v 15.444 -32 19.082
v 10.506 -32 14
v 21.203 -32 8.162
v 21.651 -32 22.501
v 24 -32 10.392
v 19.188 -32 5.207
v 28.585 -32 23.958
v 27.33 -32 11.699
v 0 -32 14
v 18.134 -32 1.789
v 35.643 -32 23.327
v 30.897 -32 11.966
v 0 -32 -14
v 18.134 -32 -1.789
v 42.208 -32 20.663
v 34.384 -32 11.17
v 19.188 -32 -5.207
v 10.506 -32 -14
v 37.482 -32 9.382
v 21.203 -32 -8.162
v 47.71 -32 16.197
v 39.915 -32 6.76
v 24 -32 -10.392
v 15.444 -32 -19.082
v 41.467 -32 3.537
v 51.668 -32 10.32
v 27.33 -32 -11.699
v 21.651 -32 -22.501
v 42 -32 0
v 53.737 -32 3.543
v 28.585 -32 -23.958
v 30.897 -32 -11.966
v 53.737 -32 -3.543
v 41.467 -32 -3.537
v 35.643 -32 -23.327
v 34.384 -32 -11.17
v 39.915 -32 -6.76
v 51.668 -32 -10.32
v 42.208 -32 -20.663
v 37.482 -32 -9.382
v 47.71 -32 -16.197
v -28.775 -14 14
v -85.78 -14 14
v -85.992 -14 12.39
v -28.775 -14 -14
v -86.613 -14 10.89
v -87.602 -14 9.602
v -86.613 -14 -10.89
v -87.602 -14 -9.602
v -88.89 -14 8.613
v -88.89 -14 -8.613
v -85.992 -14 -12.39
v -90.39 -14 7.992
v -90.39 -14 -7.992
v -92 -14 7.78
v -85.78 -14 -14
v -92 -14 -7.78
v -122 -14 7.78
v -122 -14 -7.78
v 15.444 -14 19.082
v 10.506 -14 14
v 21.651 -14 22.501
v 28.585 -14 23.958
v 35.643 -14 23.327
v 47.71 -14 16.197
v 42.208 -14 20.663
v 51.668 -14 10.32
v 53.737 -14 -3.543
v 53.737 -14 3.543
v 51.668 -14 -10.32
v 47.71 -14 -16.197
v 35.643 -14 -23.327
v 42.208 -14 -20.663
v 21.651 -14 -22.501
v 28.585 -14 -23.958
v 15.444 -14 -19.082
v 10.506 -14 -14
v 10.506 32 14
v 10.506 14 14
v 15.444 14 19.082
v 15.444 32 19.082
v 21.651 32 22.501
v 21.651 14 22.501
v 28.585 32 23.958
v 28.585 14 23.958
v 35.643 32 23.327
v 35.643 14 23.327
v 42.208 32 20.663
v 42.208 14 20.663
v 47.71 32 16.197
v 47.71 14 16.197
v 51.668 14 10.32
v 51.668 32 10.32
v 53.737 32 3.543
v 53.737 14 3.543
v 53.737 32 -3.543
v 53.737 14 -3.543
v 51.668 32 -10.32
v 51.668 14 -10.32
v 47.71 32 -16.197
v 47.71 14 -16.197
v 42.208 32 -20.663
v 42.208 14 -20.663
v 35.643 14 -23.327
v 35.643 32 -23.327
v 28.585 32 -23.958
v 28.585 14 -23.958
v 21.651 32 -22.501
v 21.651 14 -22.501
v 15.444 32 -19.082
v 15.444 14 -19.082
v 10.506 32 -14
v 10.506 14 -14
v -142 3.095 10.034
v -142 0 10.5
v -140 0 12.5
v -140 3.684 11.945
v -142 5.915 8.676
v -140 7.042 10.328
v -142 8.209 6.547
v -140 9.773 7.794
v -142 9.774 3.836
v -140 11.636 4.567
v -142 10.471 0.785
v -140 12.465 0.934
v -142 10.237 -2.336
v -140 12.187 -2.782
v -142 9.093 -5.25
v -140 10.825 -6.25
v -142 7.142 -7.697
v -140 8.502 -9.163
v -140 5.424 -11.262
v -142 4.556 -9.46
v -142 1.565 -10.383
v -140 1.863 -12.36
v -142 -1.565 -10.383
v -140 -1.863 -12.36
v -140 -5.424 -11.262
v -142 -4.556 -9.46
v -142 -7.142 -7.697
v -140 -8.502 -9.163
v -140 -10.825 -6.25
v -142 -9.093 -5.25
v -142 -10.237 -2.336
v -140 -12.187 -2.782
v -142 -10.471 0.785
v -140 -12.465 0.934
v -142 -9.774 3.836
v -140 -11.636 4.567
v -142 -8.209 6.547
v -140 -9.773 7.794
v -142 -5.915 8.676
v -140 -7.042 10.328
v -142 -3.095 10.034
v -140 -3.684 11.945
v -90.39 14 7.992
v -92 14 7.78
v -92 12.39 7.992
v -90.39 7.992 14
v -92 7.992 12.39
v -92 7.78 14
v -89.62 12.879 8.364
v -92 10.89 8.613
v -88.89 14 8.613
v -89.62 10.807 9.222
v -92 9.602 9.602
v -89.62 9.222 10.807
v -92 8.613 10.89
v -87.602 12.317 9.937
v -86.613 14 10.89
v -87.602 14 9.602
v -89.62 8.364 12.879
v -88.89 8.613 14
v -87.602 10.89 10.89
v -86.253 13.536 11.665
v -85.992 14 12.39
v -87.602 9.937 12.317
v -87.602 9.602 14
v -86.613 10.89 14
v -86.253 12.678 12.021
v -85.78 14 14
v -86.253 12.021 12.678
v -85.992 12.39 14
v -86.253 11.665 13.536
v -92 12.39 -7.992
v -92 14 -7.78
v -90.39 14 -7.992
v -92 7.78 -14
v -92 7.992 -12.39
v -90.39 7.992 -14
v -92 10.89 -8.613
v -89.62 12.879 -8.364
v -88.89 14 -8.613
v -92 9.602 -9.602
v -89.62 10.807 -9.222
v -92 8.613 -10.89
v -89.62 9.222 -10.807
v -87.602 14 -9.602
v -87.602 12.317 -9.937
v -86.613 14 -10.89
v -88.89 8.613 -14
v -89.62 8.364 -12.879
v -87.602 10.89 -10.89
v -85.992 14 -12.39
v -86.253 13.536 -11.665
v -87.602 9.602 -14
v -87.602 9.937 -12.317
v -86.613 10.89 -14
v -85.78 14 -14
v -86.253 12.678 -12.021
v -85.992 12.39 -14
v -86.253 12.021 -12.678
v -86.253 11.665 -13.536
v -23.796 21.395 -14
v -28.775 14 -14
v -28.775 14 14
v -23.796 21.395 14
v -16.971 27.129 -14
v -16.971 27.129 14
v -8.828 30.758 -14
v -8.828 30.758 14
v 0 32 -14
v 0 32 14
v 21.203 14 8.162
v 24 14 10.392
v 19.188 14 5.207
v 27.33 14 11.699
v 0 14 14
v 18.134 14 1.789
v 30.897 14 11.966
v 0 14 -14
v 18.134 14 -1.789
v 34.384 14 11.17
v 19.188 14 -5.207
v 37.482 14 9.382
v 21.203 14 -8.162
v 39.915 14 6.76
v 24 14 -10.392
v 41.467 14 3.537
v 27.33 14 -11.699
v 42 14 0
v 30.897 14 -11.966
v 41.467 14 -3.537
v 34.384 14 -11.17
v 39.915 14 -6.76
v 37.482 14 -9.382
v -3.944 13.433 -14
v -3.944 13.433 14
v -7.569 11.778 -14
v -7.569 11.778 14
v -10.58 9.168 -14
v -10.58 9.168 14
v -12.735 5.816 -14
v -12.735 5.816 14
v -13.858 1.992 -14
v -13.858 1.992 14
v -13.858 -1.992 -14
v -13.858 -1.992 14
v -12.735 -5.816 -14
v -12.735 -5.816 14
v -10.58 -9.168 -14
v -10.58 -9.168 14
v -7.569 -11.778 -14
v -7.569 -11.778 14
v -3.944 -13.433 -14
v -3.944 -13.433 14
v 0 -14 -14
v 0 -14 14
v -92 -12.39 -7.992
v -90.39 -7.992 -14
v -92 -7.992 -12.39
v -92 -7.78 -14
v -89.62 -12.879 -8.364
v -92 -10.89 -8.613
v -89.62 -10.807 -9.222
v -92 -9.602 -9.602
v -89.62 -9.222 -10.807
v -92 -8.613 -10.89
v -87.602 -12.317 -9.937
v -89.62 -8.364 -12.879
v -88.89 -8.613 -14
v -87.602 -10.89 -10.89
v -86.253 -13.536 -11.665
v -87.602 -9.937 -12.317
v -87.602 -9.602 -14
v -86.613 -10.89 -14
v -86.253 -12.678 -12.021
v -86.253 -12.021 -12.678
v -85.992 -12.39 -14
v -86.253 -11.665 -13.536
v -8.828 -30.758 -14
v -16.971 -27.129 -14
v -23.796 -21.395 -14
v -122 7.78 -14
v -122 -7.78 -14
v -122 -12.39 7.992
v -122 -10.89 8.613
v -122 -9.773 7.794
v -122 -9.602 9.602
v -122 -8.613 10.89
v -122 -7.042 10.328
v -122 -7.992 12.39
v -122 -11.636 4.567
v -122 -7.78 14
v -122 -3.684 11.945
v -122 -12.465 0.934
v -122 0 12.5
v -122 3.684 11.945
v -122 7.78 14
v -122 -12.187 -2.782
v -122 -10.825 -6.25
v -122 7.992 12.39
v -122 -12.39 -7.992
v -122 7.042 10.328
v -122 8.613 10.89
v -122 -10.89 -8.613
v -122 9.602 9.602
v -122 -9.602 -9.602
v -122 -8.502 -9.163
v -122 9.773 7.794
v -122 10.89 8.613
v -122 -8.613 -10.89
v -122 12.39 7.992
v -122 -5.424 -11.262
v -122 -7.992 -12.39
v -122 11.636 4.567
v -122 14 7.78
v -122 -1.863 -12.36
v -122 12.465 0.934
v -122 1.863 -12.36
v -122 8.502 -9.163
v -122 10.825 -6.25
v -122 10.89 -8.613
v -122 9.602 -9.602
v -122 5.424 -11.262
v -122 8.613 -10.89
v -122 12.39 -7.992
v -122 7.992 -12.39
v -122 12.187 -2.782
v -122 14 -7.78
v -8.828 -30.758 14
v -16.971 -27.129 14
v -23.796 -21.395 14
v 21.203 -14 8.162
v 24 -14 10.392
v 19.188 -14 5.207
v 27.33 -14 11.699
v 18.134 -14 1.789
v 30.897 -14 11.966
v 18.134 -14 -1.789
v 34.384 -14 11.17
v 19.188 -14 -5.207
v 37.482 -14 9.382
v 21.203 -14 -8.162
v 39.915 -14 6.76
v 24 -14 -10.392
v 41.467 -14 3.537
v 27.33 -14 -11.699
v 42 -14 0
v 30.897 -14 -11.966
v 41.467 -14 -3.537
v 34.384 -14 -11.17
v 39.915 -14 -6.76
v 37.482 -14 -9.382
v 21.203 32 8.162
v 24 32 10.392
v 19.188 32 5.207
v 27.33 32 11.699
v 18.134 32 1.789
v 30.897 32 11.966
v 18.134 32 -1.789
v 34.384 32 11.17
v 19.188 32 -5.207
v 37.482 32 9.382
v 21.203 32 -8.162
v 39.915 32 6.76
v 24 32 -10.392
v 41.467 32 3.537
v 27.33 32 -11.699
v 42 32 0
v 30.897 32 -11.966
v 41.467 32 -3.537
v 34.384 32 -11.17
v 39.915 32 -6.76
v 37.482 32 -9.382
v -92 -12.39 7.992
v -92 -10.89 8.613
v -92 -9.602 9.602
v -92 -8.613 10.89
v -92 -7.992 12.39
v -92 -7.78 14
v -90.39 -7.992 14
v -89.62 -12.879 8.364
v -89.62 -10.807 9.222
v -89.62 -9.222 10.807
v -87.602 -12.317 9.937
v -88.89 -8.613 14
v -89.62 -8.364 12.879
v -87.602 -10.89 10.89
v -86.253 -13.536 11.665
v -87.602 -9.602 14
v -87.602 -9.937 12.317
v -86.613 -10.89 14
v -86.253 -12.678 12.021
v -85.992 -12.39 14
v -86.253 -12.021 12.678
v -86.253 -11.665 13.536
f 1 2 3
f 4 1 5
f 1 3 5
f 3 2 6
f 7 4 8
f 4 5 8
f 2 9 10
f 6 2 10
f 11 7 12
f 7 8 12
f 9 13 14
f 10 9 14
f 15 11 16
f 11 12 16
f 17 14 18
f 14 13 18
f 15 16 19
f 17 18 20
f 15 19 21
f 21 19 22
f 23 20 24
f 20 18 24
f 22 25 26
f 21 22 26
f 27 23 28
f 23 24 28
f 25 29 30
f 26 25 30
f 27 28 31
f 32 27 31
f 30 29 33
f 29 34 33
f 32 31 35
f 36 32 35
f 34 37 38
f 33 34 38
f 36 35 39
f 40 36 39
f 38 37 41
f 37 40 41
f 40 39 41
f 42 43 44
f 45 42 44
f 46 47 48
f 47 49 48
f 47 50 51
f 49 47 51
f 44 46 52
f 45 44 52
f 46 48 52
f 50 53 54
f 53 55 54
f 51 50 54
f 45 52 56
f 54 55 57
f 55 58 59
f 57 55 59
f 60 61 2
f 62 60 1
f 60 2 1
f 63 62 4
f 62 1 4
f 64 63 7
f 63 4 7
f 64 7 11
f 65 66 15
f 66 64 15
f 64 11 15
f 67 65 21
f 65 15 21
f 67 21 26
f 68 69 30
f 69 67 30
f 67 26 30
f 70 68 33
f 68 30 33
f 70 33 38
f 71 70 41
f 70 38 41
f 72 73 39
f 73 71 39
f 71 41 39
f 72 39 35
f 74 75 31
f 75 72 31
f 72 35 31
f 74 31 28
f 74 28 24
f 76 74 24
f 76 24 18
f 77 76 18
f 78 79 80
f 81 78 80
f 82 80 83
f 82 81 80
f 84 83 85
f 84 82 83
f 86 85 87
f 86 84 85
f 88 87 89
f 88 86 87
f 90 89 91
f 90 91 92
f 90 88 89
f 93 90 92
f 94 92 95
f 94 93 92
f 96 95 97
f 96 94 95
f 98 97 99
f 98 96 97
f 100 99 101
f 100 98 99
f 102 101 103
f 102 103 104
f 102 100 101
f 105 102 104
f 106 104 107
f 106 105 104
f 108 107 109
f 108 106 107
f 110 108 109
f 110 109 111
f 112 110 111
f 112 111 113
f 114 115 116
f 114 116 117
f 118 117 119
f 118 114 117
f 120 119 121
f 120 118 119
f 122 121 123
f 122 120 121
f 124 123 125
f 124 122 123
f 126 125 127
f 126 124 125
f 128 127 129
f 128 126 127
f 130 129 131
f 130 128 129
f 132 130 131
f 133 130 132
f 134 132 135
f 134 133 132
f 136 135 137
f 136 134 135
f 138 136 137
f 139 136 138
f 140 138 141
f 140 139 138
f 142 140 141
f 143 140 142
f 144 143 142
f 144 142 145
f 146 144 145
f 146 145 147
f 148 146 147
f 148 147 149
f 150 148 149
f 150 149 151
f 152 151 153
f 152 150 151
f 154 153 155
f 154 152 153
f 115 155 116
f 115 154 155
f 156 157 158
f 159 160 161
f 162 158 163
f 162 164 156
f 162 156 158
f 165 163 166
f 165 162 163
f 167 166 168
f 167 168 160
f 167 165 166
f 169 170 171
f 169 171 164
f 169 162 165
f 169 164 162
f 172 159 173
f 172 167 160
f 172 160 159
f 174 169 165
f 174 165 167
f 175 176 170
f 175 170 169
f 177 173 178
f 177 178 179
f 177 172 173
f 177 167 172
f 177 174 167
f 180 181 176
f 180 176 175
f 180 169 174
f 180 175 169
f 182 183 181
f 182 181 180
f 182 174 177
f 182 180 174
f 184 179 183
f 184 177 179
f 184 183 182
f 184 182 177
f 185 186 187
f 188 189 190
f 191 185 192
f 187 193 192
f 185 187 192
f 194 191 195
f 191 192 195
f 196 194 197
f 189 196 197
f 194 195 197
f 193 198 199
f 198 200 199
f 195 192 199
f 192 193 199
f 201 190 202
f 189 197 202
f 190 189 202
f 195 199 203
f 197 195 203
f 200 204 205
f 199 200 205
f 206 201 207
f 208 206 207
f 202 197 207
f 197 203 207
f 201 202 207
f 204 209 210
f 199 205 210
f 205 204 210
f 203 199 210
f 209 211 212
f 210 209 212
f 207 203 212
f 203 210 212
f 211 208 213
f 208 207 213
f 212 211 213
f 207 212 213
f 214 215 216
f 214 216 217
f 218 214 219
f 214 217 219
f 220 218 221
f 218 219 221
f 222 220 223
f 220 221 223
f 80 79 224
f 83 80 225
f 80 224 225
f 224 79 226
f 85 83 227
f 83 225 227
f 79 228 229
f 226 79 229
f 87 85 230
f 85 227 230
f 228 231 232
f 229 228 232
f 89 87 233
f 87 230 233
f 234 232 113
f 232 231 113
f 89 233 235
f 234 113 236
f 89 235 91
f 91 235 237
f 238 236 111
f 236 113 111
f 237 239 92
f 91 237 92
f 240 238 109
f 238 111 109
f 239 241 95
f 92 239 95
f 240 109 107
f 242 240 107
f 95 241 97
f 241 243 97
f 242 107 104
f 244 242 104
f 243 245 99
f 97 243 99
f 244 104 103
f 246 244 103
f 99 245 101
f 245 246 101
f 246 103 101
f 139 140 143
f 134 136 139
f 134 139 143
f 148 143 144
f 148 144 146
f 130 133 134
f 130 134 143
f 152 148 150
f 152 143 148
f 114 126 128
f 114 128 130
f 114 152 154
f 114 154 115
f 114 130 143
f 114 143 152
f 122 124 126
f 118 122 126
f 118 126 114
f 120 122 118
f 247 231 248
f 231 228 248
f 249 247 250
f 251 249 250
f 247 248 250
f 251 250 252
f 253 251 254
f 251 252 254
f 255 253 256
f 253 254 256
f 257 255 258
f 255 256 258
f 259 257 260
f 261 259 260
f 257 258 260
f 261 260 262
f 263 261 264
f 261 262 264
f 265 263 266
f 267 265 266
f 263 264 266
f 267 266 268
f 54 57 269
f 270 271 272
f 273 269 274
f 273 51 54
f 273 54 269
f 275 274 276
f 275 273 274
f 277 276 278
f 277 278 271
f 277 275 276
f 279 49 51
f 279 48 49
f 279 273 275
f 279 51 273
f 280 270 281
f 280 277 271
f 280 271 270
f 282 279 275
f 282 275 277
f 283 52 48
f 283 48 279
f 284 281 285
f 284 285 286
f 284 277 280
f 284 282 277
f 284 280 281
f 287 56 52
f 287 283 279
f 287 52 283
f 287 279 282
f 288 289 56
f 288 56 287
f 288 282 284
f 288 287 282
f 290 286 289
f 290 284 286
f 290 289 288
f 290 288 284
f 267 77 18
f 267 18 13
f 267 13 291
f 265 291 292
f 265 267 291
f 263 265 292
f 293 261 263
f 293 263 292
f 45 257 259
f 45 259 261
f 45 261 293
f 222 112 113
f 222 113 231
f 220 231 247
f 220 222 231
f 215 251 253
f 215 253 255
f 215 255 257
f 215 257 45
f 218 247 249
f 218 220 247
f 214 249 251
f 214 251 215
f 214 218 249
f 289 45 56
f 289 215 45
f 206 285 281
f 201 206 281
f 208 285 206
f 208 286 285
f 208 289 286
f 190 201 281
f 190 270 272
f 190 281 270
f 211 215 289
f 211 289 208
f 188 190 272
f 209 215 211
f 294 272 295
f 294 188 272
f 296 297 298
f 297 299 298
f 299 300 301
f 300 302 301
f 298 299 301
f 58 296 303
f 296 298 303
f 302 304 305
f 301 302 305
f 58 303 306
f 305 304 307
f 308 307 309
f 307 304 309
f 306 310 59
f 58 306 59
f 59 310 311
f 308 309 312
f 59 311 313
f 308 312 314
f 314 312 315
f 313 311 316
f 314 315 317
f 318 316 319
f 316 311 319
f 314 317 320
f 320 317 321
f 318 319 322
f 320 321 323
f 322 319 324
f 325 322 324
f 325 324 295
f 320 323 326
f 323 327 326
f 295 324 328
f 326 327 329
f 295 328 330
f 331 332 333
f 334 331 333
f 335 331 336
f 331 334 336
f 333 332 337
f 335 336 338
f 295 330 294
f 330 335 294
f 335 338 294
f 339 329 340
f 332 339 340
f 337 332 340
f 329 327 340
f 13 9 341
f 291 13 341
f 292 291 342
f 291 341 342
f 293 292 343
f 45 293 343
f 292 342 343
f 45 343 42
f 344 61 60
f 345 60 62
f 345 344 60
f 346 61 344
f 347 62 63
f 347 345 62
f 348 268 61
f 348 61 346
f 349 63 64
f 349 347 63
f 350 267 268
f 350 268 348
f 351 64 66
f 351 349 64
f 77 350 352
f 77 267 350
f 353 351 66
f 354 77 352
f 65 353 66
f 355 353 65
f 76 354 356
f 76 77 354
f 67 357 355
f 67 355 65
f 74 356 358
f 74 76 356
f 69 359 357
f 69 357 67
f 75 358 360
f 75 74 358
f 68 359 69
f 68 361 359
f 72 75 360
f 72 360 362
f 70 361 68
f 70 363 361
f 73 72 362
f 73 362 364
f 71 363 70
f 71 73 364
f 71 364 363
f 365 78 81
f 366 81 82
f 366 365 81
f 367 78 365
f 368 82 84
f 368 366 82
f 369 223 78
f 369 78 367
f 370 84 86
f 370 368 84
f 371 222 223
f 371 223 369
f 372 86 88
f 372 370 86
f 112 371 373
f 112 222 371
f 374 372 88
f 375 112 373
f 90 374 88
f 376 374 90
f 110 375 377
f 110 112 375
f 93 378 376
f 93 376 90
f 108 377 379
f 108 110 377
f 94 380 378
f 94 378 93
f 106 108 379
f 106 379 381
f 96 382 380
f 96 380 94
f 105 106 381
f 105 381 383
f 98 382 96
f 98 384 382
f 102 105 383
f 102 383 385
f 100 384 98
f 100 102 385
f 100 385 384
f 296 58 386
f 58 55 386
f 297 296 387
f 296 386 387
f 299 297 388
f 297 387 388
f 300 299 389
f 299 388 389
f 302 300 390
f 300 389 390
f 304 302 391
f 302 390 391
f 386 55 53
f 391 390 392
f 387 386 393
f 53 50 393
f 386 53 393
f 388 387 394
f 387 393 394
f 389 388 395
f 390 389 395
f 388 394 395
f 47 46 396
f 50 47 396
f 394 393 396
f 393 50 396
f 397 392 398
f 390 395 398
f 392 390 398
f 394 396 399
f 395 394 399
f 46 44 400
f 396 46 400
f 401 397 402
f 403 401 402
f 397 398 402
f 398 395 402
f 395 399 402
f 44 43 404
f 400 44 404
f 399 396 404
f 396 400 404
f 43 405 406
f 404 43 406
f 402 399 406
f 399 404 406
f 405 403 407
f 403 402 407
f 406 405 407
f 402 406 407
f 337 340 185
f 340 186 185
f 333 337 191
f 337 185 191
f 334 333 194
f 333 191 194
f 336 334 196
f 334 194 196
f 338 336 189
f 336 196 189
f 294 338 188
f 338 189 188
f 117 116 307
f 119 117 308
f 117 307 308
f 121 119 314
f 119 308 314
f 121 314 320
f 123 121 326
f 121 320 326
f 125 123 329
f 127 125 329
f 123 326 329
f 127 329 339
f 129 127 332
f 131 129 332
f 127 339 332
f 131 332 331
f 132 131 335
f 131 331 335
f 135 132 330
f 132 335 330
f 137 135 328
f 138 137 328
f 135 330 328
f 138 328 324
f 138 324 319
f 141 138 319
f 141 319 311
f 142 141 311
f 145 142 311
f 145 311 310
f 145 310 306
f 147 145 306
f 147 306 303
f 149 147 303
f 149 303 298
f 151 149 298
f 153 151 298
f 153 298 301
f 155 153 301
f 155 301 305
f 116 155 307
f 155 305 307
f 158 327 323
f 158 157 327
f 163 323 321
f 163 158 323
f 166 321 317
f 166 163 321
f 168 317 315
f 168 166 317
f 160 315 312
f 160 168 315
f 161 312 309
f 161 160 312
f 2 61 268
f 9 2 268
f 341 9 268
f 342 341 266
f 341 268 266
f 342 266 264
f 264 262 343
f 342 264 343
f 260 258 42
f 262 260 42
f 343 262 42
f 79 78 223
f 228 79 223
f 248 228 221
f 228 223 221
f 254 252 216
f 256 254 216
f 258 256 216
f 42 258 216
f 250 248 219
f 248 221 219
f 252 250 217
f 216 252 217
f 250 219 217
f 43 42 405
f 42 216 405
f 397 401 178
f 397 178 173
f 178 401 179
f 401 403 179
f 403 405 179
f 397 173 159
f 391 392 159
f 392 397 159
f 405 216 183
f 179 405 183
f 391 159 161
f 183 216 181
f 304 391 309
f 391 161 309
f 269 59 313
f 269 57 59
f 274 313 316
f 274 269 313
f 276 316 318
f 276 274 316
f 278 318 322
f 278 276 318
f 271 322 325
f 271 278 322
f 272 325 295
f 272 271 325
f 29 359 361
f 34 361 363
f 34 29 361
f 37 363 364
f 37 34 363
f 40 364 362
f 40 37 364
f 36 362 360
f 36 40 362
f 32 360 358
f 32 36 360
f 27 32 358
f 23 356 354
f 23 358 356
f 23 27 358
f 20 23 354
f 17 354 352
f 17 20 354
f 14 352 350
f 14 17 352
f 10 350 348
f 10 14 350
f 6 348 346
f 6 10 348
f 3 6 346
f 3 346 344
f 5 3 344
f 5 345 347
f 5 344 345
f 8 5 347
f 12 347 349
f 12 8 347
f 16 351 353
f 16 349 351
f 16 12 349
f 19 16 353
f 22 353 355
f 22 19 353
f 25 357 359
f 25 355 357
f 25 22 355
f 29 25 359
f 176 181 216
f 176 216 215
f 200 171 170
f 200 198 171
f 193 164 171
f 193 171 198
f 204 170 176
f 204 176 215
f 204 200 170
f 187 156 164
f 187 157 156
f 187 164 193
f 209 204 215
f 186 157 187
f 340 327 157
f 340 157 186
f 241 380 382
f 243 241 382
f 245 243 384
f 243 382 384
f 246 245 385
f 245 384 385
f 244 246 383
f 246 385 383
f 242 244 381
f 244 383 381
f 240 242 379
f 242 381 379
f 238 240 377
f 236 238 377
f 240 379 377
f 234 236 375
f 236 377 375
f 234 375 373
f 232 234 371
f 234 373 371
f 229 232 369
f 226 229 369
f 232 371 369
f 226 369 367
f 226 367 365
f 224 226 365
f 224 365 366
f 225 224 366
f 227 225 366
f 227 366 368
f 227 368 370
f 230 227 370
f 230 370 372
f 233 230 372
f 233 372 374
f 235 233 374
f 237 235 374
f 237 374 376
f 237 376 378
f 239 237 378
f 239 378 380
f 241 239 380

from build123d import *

# Parameters (mm, degrees)
BOSS_EXTRUDE1_DEPTH = 14
SKETCH2_R           = 24
SKETCH2_R_2         = 12
BOSS_EXTRUDE2_DEPTH = 18
BOSS_EXTRUDE3_REACH = 178
SKETCH3_W           = 28
SKETCH3_H           = 28
SKETCH5_R           = 12.5
BOSS_EXTRUDE4_DEPTH = 20
CHAMFER1_SIZE       = 2


with BuildPart() as part:
    # Sketch1 → Boss-Extrude1 (new body, symmetric)
    with BuildSketch(Plane.XY):
        with BuildLine():
            Line((0, 32), (18, 32))
            Line((18, 32), (18, 14))
            Line((18, 14), (0, 14))
            ThreePointArc((0, 14), (-14, 0), (0, -14))
            Line((0, -14), (18, -14))
            Line((18, -14), (18, -32))
            Line((18, -32), (0, -32))
            ThreePointArc((0, -32), (-32, 0), (0, 32))
        make_face()
    extrude(amount=BOSS_EXTRUDE1_DEPTH, both=True)

    # Sketch2 → Boss-Extrude2 (add)
    with BuildSketch(Plane(origin=(0, 32, 0), x_dir=(1, 0, 0), z_dir=(0, 1, 0))):
        with Locations((30, 0)):
            Circle(SKETCH2_R)
        with Locations((30, 0)):
            Circle(SKETCH2_R_2, mode=Mode.SUBTRACT)
    boss_extrude2 = extrude(amount=-BOSS_EXTRUDE2_DEPTH)

    # Mirror1: Boss-Extrude2 across plane
    add(boss_extrude2.mirror(Plane.ZX))

    # Sketch3 → Boss-Extrude3 (add, up to next)
    with BuildSketch(Plane(origin=(-122, 0, 0), x_dir=(0, 0, -1), z_dir=(1, 0, 0)), mode=Mode.PRIVATE) as boss_extrude3_sk1:
        Rectangle(SKETCH3_W, SKETCH3_H)
    boss_extrude3_tool1 = extrude(boss_extrude3_sk1.sketch, amount=BOSS_EXTRUDE3_REACH, mode=Mode.PRIVATE) - part.part
    add(boss_extrude3_tool1.solids().sort_by_distance((-122, 0, 0))[0])

    # Sketch4 → Cut-Revolve1 (revolve, cut)
    with BuildSketch(Plane.XY.offset(14)):
        with BuildLine():
            Line((-122, 14), (-122, 7.78))
            Line((-122, 7.78), (-92, 7.78))
            ThreePointArc((-92, 7.78), (-87.601795821, 9.601795821), (-85.78, 14))
            Line((-85.78, 14), (-122, 14))
        make_face()
    cut_revolve1 = revolve(axis=Axis((500000, 14, 14), (-1, 0, 0)), mode=Mode.SUBTRACT)

    # Mirror2: Cut-Revolve1 across plane
    add(cut_revolve1.mirror(Plane.XY), mode=Mode.SUBTRACT)

    # Mirror3: Cut-Revolve1 across plane
    add(cut_revolve1.mirror(Plane.ZX), mode=Mode.SUBTRACT)

    # Mirror3 copy 1 sketch → Mirror3 copy 1 (revolve, cut)
    with BuildSketch(Plane(origin=(0, 0, -14), x_dir=(1, 0, 0), z_dir=(0, 0, -1))):
        with BuildLine():
            Line((-122, 14), (-122, 7.78))
            Line((-122, 7.78), (-92, 7.78))
            ThreePointArc((-92, 7.78), (-87.601795821, 9.601795821), (-85.78, 14))
            Line((-85.78, 14), (-122, 14))
        make_face()
    revolve(axis=Axis((500000, -14, -14), (-1, 0, 0)), mode=Mode.SUBTRACT)

    # Sketch5 → Boss-Extrude4 (add)
    with BuildSketch(Plane.ZY.offset(122)):
        Circle(SKETCH5_R)
    extrude(amount=BOSS_EXTRUDE4_DEPTH)

    # Chamfer1
    chamfer1_edges = [part.edges().sort_by_distance(p)[0] for p in [
        (-142, 0, -12.5),
    ]]
    chamfer(chamfer1_edges, length=CHAMFER1_SIZE)


solid = part.part
